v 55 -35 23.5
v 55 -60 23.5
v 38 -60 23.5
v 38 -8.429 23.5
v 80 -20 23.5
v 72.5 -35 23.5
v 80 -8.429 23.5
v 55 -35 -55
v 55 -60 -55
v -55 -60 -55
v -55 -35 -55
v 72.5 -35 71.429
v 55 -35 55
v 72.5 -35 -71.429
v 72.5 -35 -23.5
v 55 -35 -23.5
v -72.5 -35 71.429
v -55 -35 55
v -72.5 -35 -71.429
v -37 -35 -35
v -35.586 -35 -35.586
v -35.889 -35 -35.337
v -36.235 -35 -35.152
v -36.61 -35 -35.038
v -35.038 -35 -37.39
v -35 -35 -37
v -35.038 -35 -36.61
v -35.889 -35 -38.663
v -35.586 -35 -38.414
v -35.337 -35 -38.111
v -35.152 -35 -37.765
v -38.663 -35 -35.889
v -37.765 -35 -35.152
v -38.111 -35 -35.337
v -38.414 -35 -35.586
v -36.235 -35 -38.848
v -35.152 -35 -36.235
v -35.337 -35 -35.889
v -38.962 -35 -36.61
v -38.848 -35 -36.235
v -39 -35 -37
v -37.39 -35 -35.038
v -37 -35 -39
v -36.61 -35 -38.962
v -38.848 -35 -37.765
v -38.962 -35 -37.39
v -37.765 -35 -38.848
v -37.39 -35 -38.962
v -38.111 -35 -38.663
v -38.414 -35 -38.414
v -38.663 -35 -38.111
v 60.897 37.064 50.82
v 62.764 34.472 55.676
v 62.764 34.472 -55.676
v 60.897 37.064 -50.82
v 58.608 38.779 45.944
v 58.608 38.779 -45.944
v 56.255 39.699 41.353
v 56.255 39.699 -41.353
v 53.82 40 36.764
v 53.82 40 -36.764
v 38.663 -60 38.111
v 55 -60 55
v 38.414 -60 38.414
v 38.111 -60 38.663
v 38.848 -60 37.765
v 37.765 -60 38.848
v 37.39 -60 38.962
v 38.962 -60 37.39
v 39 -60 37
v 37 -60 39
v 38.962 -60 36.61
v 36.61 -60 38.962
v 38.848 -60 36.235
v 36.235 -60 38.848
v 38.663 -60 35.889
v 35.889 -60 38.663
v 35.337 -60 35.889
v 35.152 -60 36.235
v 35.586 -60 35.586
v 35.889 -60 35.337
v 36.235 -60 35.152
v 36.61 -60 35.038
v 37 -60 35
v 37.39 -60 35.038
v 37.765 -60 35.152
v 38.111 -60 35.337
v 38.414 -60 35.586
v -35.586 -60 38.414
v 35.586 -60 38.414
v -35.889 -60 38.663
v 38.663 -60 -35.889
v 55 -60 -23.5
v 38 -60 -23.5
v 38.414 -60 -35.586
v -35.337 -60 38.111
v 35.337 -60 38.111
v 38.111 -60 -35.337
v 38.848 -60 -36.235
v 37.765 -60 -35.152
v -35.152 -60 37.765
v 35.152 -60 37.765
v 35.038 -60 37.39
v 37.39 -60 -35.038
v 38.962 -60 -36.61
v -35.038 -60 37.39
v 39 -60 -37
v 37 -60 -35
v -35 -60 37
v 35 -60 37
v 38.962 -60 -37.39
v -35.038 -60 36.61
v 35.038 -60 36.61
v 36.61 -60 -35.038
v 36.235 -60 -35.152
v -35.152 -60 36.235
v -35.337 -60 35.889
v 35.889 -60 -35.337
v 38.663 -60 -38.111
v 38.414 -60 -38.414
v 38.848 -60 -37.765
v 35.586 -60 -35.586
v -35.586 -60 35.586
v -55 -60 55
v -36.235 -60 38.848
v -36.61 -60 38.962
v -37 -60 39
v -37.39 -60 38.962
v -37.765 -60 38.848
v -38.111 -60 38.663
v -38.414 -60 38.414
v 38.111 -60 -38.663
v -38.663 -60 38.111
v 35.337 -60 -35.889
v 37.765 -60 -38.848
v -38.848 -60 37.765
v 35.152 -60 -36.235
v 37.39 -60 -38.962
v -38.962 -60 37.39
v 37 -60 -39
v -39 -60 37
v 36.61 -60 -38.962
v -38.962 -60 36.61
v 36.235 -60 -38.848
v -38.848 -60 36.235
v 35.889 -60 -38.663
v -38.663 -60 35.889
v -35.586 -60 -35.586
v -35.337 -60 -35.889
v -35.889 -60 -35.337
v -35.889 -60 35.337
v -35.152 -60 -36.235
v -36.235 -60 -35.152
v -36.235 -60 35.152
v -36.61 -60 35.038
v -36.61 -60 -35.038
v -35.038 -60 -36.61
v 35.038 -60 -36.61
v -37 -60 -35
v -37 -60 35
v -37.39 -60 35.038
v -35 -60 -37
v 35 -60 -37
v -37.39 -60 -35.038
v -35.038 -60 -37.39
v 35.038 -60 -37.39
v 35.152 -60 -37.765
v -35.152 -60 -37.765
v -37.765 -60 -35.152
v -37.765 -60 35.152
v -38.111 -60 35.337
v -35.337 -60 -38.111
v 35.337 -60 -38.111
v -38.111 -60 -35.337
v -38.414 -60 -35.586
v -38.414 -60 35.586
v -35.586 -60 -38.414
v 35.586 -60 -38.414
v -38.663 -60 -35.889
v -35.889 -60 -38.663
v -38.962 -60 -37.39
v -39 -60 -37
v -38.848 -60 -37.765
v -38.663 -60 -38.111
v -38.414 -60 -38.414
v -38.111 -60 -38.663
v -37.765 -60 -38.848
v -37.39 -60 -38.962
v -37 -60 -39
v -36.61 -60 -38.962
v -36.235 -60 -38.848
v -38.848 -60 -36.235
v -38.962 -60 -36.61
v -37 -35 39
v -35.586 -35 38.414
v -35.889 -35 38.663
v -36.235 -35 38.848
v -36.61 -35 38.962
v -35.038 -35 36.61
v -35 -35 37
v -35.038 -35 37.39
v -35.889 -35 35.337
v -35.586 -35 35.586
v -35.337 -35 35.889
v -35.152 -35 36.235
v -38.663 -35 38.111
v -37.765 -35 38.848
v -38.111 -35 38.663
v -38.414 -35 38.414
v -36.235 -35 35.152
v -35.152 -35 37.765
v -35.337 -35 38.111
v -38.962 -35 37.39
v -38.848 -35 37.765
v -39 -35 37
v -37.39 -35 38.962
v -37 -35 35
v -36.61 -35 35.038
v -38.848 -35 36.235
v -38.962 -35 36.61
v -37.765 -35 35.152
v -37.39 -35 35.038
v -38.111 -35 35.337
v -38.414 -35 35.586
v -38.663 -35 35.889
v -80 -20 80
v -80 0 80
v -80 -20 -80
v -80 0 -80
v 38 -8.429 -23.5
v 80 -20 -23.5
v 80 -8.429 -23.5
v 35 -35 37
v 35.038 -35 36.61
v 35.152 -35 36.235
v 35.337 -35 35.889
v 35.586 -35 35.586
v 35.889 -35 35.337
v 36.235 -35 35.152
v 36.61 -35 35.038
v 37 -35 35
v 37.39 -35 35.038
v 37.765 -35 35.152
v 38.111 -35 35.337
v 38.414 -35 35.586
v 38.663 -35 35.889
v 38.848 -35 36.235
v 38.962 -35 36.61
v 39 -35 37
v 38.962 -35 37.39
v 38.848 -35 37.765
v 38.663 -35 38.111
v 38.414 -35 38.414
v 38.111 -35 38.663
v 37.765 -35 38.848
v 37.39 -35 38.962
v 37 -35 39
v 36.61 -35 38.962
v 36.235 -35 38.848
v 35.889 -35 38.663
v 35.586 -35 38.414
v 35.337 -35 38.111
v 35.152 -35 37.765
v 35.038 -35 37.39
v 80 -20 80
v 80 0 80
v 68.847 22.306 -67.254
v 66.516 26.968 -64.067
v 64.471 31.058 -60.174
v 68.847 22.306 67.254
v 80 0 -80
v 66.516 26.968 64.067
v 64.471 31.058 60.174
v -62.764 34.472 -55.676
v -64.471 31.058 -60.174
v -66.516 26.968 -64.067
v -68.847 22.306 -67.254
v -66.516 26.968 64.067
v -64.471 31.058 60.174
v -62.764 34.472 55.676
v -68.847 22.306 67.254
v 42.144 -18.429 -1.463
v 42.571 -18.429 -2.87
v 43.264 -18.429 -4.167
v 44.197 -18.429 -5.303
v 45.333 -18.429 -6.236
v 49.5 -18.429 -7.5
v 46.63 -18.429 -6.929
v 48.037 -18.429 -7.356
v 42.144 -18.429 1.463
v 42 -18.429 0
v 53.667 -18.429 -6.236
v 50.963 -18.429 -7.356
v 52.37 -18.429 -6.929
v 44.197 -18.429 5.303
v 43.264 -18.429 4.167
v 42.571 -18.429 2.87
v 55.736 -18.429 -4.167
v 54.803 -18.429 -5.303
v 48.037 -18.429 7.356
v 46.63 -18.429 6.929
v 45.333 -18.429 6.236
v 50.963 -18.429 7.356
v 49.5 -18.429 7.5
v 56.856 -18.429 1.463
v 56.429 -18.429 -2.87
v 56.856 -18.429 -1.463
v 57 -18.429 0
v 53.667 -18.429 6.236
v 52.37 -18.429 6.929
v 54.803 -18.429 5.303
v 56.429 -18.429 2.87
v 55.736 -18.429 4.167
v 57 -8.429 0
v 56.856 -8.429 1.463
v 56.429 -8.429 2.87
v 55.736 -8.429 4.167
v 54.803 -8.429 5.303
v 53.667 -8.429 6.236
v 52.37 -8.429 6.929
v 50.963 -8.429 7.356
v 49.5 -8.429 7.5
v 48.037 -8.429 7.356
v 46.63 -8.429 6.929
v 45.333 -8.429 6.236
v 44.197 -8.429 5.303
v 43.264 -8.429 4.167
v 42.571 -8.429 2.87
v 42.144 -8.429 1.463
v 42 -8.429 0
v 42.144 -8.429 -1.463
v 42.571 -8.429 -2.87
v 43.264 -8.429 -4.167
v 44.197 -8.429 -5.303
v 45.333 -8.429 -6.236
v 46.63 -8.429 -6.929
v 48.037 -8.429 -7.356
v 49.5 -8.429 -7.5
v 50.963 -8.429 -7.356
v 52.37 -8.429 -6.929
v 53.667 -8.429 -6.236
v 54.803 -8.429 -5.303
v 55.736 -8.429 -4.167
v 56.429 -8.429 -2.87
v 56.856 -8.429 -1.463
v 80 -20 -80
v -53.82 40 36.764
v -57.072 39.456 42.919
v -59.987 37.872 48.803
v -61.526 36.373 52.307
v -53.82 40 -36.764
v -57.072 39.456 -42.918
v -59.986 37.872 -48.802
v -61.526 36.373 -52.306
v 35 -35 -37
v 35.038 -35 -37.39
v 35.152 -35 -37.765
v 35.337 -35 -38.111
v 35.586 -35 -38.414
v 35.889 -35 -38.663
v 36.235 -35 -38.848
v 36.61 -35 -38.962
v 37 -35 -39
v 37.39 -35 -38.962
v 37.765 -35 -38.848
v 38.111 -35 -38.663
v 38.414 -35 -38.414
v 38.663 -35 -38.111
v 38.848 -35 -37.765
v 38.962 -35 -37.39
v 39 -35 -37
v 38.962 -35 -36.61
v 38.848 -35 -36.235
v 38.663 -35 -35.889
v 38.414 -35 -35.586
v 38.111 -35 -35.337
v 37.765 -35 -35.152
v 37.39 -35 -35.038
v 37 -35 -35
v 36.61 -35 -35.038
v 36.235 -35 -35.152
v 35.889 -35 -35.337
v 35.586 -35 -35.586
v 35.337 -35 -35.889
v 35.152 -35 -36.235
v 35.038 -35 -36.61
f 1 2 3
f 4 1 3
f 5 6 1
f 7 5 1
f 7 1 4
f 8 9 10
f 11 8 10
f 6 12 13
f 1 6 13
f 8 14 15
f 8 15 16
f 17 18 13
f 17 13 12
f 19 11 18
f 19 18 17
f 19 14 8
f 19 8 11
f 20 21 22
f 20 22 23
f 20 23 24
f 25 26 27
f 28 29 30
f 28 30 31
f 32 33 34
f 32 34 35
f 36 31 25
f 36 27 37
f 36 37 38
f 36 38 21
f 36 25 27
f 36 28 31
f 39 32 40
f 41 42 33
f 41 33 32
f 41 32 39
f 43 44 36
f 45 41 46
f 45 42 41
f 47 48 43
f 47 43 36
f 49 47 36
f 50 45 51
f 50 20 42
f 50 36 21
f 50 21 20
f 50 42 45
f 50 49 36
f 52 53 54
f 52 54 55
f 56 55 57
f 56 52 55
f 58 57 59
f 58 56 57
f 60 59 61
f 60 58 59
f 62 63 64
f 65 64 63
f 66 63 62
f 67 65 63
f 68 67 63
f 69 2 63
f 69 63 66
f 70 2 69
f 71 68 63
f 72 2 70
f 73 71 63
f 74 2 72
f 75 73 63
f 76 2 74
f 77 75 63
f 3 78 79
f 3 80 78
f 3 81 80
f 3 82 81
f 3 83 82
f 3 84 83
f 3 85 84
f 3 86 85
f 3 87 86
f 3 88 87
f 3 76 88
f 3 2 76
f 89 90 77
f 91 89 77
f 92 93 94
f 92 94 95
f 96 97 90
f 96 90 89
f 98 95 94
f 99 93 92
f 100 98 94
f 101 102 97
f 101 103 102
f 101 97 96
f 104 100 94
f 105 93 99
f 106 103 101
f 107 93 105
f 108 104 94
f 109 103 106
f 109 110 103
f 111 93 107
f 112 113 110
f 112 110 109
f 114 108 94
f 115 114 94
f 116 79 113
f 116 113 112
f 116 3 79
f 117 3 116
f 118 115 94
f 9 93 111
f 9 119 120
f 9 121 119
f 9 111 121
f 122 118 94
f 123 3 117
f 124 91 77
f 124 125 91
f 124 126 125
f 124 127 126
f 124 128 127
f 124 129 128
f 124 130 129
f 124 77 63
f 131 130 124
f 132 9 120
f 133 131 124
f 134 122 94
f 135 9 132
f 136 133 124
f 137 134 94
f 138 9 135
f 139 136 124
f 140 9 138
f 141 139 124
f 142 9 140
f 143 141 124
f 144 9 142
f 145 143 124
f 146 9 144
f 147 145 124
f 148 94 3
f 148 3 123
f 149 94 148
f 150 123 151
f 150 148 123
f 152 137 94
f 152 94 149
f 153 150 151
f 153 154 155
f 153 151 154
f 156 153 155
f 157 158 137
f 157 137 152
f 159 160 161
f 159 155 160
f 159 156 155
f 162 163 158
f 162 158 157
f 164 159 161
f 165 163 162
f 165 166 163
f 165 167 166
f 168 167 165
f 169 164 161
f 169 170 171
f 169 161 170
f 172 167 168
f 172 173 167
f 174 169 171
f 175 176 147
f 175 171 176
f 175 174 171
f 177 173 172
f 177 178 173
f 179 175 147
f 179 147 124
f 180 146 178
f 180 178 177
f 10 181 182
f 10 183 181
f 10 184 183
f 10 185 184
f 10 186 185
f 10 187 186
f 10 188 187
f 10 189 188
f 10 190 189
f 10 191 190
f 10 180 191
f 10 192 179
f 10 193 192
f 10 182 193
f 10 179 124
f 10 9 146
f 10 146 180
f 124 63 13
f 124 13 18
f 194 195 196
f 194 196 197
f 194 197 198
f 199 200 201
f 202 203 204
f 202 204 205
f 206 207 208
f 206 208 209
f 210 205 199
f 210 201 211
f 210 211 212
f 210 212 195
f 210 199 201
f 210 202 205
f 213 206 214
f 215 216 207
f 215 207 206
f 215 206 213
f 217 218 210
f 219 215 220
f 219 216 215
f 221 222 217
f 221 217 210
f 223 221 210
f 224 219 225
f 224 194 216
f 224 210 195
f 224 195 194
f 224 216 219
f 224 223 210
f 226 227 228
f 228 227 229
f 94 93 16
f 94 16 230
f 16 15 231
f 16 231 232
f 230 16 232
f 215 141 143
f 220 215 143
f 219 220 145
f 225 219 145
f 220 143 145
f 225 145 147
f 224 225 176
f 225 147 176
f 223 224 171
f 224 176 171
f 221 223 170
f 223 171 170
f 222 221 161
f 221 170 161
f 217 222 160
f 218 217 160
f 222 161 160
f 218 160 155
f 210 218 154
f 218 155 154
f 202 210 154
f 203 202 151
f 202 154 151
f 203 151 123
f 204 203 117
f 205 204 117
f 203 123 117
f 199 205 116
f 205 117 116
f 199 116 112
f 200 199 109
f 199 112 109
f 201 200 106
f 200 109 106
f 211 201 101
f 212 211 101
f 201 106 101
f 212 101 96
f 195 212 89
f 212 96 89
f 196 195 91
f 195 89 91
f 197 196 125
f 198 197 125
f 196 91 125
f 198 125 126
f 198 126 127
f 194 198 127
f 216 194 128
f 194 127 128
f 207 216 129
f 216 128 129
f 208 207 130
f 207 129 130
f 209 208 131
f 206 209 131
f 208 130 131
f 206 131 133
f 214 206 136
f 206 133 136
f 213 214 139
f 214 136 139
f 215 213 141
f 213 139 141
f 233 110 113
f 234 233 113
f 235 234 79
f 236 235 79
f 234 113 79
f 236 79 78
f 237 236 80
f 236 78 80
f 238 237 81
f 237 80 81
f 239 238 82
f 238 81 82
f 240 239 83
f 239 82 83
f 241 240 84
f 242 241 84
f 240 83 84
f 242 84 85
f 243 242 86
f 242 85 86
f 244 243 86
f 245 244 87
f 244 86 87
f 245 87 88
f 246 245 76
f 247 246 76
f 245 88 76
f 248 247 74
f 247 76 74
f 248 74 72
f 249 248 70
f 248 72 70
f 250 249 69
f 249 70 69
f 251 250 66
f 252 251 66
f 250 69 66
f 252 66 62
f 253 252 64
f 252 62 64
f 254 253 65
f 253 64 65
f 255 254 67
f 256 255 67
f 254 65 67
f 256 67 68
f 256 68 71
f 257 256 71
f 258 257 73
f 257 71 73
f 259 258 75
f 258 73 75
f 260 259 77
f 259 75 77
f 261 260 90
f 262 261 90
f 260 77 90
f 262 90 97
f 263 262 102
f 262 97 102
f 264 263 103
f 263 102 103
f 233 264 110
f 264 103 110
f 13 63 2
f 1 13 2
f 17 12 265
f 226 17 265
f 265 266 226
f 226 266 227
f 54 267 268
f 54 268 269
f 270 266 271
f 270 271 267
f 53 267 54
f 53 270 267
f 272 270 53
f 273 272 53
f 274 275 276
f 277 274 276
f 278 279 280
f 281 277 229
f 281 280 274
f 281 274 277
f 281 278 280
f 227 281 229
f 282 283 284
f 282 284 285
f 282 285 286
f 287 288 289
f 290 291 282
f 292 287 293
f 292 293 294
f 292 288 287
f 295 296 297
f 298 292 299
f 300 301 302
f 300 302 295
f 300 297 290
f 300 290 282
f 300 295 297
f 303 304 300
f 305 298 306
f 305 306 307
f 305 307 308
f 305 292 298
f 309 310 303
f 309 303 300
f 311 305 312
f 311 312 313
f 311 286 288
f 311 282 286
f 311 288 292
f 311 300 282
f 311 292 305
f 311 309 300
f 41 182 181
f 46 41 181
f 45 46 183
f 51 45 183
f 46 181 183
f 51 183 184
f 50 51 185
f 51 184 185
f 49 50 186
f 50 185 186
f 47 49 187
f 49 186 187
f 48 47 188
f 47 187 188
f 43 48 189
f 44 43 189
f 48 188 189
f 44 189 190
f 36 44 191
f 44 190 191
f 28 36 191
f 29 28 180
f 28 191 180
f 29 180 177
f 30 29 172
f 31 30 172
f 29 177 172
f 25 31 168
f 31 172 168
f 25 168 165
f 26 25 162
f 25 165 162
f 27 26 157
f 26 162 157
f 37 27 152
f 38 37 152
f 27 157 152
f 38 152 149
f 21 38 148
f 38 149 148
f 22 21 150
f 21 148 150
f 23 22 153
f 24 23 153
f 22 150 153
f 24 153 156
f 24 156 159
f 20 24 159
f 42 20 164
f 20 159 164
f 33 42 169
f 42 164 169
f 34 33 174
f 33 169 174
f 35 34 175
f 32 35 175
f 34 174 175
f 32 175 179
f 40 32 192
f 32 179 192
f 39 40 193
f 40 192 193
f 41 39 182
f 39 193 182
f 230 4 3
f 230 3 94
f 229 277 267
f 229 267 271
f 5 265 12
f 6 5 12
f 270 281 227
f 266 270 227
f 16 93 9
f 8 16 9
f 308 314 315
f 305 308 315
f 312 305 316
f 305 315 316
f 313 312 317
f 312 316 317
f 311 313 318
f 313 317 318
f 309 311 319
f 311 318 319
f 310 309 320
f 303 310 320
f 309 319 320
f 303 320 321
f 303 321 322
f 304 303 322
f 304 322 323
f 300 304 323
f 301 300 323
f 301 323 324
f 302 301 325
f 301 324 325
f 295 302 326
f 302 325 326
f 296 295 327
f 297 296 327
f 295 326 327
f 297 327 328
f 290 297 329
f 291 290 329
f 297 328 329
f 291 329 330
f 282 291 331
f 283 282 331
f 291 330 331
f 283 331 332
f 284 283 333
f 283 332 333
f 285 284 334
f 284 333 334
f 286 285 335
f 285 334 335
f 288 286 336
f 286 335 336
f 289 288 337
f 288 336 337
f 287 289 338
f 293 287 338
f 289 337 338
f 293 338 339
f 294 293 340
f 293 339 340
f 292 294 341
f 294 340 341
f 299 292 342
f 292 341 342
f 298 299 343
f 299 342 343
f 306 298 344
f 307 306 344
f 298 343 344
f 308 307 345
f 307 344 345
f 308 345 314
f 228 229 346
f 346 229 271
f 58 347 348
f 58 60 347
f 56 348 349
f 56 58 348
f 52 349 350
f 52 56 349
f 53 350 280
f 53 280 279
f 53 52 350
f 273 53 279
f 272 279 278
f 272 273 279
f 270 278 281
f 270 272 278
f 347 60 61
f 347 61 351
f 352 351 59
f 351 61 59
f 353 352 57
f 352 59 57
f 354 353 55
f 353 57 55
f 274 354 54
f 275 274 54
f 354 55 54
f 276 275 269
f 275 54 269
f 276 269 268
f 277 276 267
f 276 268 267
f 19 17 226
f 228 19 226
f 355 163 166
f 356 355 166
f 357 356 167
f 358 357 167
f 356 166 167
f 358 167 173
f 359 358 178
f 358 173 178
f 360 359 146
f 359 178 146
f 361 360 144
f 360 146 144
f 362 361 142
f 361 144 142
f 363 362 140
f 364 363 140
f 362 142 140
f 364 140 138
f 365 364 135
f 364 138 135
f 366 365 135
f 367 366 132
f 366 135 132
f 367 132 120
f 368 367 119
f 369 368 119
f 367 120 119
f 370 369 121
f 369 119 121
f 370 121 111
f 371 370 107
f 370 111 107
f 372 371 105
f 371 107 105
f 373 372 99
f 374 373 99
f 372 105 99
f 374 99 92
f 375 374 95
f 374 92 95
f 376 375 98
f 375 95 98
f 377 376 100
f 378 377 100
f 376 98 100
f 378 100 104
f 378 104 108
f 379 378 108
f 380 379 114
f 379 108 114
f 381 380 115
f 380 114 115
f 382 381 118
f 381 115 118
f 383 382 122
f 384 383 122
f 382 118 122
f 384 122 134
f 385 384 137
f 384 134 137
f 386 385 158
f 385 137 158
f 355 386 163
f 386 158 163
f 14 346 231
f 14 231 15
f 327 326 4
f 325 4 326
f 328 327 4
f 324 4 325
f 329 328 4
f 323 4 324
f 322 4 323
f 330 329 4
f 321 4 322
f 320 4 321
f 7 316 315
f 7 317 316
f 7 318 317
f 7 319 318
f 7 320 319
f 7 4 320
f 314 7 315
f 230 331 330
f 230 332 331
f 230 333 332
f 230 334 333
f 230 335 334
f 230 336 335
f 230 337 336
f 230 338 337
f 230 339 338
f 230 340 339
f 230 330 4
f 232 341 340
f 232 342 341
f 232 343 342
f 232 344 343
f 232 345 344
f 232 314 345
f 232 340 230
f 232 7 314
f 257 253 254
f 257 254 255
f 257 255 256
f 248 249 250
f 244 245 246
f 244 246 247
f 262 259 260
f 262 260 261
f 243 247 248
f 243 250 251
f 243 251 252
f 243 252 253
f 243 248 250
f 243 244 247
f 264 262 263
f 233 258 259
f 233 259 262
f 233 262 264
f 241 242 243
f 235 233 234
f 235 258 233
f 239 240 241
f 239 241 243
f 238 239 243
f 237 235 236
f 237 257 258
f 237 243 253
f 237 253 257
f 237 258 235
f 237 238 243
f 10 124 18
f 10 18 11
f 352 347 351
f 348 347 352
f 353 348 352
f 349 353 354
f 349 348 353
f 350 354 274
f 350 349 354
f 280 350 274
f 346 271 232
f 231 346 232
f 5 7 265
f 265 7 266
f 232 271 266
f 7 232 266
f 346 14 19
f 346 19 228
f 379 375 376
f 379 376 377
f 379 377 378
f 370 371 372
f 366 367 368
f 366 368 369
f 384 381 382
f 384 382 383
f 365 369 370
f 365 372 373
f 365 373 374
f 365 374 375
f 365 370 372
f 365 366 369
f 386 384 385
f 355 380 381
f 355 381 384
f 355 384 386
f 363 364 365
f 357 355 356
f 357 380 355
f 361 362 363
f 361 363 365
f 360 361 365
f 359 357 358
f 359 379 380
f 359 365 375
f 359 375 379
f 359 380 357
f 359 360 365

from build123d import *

# Parameters (mm, degrees)
BOSS_EXTRUDE1_DEPTH        = 80
BOSS_EXTRUDE1_DEPTH_BACK   = 80
BOSS_EXTRUDE1_2_DEPTH      = 80
BOSS_EXTRUDE1_2_DEPTH_BACK = 80
CUT_EXTRUDE2_DEPTH         = 81
CUT_EXTRUDE2_DEPTH_BACK    = 81
BOSS_EXTRUDE2_DEPTH        = 20
SKETCH6_W                  = 160
SKETCH6_H                  = 160
CUT_EXTRUDE3_DEPTH         = 25
SKETCH7_W                  = 110
SKETCH7_H                  = 110
BOSS_EXTRUDE3_DEPTH        = 25
SKETCH8_R                  = 2
CUT_EXTRUDE4_DEPTH         = 25
SKETCH9_W                  = 47
SKETCH9_H                  = 51.571101879
CUT_EXTRUDE5_DEPTH         = 42
SKETCH10_R                 = 7.5
BOSS_EXTRUDE4_DEPTH        = 10


with BuildPart() as part:
    # Sketch1 → Boss-Extrude1 (new body, two sides)
    with BuildSketch(Plane.XY) as boss_extrude1_sk:
        with BuildLine():
            Line((-80, 0), (80, 0))
            Line((80, 0), (62.763932023, 34.472135955))
            ThreePointArc((62.763932023, 34.472135955), (59.076971234, 38.506508084), (53.819660113, 40))
            Line((53.819660113, 40), (-53.819660113, 40))
            ThreePointArc((-53.819660113, 40), (-59.076971234, 38.506508084), (-62.763932023, 34.472135955))
            Line((-62.763932023, 34.472135955), (-80, 0))
        make_face()
    extrude(amount=BOSS_EXTRUDE1_DEPTH)
    extrude(boss_extrude1_sk.sketch, amount=-BOSS_EXTRUDE1_DEPTH_BACK)


with BuildPart() as body_2:
    # Sketch1 → Boss-Extrude1 2 (new body, two sides)
    with BuildSketch(Plane.XY) as boss_extrude1_2_sk:
        with BuildLine():
            Line((-62.763932023, -54.472135955), (-80, -20))
            Line((-80, -20), (80, -20))
            Line((80, -20), (62.763932023, -54.472135955))
            ThreePointArc((62.763932023, -54.472135955), (59.076971234, -58.506508084), (53.819660113, -60))
            Line((53.819660113, -60), (-53.819660113, -60))
            ThreePointArc((-53.819660113, -60), (-59.076971234, -58.506508084), (-62.763932023, -54.472135955))
        make_face()
    extrude(amount=BOSS_EXTRUDE1_2_DEPTH)
    extrude(boss_extrude1_2_sk.sketch, amount=-BOSS_EXTRUDE1_2_DEPTH_BACK)


with BuildPart() as cut_extrude2_tool:
    # Sketch2 → Cut-Extrude2 (new body, two sides)
    with BuildSketch(Plane(origin=(0, 0, 0), x_dir=(0, 0, -1), z_dir=(1, 0, 0))) as cut_extrude2_sk:
        with BuildLine():
            Line((67.253579514, 22.306235851), (80, 0))
            Line((80, 0), (80, 40))
            Line((80, 40), (36.764044699, 40))
            ThreePointArc((36.764044699, 40), (54.389885267, 35.256134809), (67.253579514, 22.306235851))
        make_face()
        with BuildLine():
            Line((-67.253579514, 22.306235851), (-80, 0))
            Line((-80, 0), (-80, 40))
            Line((-80, 40), (-36.764044699, 40))
            ThreePointArc((-36.764044699, 40), (-54.389885267, 35.256134809), (-67.253579514, 22.306235851))
        make_face()
        with BuildLine():
            Line((80, -60), (36.764044699, -60))
            ThreePointArc((36.764044699, -60), (54.389885267, -55.256134809), (67.253579514, -42.306235851))
            Line((67.253579514, -42.306235851), (80, -20))
            Line((80, -20), (80, -60))
        make_face()
        with BuildLine():
            Line((-67.253579514, -42.306235851), (-80, -20))
            Line((-80, -20), (-80, -60))
            Line((-80, -60), (-36.764044699, -60))
            ThreePointArc((-36.764044699, -60), (-54.389885267, -55.256134809), (-67.253579514, -42.306235851))
        make_face()
    extrude(amount=CUT_EXTRUDE2_DEPTH)
    extrude(cut_extrude2_sk.sketch, amount=-CUT_EXTRUDE2_DEPTH_BACK)


with BuildPart() as part_1:
    add(part.part)

    # Cut-Extrude2: cut by cut_extrude2_tool
    add(cut_extrude2_tool.part, mode=Mode.SUBTRACT)



with BuildPart() as body_2_1:
    add(body_2.part)

    # Cut-Extrude2: cut by cut_extrude2_tool
    add(cut_extrude2_tool.part, mode=Mode.SUBTRACT)


with BuildPart() as part_2:
    add(part_1.part)

    add(body_2_1.part)  # Boss-Extrude2 merges body 2
    # Sketch3 → Boss-Extrude2 (add)
    with BuildSketch(Plane.XZ):
        Polygon((-71.300354804, -80), (71.300354804, -80), (80, -80), (80, 80), (-80, 80), (-80, -80), align=None)
    extrude(amount=BOSS_EXTRUDE2_DEPTH)

    # Sketch6 → Cut-Extrude3 (cut)
    with BuildSketch(Plane(origin=(0, -60, 0), x_dir=(-1, 0, 0), z_dir=(0, -1, 0))):
        Rectangle(SKETCH6_W, SKETCH6_H)
    extrude(amount=-CUT_EXTRUDE3_DEPTH, mode=Mode.SUBTRACT)

    # Sketch7 → Boss-Extrude3 (add)
    with BuildSketch(Plane(origin=(0, -60, 0), x_dir=(-1, 0, 0), z_dir=(0, -1, 0))):
        Rectangle(SKETCH7_W, SKETCH7_H)
    extrude(amount=-BOSS_EXTRUDE3_DEPTH)

    # Sketch8 → Cut-Extrude4 (cut)
    with BuildSketch(Plane(origin=(0, -60, 0), x_dir=(-1, 0, 0), z_dir=(0, -1, 0))):
        with Locations((-37, -37)):
            Circle(SKETCH8_R)
        with Locations((-37, 37)):
            Circle(SKETCH8_R)
        with Locations((37, 37)):
            Circle(SKETCH8_R)
        with Locations((37, -37)):
            Circle(SKETCH8_R)
    extrude(amount=-CUT_EXTRUDE4_DEPTH, mode=Mode.SUBTRACT)

    # Sketch9 → Cut-Extrude5 (cut)
    with BuildSketch(Plane(origin=(80, 0, 0), x_dir=(0, 0, -1), z_dir=(1, 0, 0))):
        with Locations((0, -34.214449061)):
            Rectangle(SKETCH9_W, SKETCH9_H)
    extrude(amount=-CUT_EXTRUDE5_DEPTH, mode=Mode.SUBTRACT)

    # Sketch10 → Boss-Extrude4 (add)
    with BuildSketch(Plane.XZ.offset(8.428898121)):
        with Locations((49.5, 0)):
            Circle(SKETCH10_R)
    extrude(amount=BOSS_EXTRUDE4_DEPTH)


solid = part_2.part
